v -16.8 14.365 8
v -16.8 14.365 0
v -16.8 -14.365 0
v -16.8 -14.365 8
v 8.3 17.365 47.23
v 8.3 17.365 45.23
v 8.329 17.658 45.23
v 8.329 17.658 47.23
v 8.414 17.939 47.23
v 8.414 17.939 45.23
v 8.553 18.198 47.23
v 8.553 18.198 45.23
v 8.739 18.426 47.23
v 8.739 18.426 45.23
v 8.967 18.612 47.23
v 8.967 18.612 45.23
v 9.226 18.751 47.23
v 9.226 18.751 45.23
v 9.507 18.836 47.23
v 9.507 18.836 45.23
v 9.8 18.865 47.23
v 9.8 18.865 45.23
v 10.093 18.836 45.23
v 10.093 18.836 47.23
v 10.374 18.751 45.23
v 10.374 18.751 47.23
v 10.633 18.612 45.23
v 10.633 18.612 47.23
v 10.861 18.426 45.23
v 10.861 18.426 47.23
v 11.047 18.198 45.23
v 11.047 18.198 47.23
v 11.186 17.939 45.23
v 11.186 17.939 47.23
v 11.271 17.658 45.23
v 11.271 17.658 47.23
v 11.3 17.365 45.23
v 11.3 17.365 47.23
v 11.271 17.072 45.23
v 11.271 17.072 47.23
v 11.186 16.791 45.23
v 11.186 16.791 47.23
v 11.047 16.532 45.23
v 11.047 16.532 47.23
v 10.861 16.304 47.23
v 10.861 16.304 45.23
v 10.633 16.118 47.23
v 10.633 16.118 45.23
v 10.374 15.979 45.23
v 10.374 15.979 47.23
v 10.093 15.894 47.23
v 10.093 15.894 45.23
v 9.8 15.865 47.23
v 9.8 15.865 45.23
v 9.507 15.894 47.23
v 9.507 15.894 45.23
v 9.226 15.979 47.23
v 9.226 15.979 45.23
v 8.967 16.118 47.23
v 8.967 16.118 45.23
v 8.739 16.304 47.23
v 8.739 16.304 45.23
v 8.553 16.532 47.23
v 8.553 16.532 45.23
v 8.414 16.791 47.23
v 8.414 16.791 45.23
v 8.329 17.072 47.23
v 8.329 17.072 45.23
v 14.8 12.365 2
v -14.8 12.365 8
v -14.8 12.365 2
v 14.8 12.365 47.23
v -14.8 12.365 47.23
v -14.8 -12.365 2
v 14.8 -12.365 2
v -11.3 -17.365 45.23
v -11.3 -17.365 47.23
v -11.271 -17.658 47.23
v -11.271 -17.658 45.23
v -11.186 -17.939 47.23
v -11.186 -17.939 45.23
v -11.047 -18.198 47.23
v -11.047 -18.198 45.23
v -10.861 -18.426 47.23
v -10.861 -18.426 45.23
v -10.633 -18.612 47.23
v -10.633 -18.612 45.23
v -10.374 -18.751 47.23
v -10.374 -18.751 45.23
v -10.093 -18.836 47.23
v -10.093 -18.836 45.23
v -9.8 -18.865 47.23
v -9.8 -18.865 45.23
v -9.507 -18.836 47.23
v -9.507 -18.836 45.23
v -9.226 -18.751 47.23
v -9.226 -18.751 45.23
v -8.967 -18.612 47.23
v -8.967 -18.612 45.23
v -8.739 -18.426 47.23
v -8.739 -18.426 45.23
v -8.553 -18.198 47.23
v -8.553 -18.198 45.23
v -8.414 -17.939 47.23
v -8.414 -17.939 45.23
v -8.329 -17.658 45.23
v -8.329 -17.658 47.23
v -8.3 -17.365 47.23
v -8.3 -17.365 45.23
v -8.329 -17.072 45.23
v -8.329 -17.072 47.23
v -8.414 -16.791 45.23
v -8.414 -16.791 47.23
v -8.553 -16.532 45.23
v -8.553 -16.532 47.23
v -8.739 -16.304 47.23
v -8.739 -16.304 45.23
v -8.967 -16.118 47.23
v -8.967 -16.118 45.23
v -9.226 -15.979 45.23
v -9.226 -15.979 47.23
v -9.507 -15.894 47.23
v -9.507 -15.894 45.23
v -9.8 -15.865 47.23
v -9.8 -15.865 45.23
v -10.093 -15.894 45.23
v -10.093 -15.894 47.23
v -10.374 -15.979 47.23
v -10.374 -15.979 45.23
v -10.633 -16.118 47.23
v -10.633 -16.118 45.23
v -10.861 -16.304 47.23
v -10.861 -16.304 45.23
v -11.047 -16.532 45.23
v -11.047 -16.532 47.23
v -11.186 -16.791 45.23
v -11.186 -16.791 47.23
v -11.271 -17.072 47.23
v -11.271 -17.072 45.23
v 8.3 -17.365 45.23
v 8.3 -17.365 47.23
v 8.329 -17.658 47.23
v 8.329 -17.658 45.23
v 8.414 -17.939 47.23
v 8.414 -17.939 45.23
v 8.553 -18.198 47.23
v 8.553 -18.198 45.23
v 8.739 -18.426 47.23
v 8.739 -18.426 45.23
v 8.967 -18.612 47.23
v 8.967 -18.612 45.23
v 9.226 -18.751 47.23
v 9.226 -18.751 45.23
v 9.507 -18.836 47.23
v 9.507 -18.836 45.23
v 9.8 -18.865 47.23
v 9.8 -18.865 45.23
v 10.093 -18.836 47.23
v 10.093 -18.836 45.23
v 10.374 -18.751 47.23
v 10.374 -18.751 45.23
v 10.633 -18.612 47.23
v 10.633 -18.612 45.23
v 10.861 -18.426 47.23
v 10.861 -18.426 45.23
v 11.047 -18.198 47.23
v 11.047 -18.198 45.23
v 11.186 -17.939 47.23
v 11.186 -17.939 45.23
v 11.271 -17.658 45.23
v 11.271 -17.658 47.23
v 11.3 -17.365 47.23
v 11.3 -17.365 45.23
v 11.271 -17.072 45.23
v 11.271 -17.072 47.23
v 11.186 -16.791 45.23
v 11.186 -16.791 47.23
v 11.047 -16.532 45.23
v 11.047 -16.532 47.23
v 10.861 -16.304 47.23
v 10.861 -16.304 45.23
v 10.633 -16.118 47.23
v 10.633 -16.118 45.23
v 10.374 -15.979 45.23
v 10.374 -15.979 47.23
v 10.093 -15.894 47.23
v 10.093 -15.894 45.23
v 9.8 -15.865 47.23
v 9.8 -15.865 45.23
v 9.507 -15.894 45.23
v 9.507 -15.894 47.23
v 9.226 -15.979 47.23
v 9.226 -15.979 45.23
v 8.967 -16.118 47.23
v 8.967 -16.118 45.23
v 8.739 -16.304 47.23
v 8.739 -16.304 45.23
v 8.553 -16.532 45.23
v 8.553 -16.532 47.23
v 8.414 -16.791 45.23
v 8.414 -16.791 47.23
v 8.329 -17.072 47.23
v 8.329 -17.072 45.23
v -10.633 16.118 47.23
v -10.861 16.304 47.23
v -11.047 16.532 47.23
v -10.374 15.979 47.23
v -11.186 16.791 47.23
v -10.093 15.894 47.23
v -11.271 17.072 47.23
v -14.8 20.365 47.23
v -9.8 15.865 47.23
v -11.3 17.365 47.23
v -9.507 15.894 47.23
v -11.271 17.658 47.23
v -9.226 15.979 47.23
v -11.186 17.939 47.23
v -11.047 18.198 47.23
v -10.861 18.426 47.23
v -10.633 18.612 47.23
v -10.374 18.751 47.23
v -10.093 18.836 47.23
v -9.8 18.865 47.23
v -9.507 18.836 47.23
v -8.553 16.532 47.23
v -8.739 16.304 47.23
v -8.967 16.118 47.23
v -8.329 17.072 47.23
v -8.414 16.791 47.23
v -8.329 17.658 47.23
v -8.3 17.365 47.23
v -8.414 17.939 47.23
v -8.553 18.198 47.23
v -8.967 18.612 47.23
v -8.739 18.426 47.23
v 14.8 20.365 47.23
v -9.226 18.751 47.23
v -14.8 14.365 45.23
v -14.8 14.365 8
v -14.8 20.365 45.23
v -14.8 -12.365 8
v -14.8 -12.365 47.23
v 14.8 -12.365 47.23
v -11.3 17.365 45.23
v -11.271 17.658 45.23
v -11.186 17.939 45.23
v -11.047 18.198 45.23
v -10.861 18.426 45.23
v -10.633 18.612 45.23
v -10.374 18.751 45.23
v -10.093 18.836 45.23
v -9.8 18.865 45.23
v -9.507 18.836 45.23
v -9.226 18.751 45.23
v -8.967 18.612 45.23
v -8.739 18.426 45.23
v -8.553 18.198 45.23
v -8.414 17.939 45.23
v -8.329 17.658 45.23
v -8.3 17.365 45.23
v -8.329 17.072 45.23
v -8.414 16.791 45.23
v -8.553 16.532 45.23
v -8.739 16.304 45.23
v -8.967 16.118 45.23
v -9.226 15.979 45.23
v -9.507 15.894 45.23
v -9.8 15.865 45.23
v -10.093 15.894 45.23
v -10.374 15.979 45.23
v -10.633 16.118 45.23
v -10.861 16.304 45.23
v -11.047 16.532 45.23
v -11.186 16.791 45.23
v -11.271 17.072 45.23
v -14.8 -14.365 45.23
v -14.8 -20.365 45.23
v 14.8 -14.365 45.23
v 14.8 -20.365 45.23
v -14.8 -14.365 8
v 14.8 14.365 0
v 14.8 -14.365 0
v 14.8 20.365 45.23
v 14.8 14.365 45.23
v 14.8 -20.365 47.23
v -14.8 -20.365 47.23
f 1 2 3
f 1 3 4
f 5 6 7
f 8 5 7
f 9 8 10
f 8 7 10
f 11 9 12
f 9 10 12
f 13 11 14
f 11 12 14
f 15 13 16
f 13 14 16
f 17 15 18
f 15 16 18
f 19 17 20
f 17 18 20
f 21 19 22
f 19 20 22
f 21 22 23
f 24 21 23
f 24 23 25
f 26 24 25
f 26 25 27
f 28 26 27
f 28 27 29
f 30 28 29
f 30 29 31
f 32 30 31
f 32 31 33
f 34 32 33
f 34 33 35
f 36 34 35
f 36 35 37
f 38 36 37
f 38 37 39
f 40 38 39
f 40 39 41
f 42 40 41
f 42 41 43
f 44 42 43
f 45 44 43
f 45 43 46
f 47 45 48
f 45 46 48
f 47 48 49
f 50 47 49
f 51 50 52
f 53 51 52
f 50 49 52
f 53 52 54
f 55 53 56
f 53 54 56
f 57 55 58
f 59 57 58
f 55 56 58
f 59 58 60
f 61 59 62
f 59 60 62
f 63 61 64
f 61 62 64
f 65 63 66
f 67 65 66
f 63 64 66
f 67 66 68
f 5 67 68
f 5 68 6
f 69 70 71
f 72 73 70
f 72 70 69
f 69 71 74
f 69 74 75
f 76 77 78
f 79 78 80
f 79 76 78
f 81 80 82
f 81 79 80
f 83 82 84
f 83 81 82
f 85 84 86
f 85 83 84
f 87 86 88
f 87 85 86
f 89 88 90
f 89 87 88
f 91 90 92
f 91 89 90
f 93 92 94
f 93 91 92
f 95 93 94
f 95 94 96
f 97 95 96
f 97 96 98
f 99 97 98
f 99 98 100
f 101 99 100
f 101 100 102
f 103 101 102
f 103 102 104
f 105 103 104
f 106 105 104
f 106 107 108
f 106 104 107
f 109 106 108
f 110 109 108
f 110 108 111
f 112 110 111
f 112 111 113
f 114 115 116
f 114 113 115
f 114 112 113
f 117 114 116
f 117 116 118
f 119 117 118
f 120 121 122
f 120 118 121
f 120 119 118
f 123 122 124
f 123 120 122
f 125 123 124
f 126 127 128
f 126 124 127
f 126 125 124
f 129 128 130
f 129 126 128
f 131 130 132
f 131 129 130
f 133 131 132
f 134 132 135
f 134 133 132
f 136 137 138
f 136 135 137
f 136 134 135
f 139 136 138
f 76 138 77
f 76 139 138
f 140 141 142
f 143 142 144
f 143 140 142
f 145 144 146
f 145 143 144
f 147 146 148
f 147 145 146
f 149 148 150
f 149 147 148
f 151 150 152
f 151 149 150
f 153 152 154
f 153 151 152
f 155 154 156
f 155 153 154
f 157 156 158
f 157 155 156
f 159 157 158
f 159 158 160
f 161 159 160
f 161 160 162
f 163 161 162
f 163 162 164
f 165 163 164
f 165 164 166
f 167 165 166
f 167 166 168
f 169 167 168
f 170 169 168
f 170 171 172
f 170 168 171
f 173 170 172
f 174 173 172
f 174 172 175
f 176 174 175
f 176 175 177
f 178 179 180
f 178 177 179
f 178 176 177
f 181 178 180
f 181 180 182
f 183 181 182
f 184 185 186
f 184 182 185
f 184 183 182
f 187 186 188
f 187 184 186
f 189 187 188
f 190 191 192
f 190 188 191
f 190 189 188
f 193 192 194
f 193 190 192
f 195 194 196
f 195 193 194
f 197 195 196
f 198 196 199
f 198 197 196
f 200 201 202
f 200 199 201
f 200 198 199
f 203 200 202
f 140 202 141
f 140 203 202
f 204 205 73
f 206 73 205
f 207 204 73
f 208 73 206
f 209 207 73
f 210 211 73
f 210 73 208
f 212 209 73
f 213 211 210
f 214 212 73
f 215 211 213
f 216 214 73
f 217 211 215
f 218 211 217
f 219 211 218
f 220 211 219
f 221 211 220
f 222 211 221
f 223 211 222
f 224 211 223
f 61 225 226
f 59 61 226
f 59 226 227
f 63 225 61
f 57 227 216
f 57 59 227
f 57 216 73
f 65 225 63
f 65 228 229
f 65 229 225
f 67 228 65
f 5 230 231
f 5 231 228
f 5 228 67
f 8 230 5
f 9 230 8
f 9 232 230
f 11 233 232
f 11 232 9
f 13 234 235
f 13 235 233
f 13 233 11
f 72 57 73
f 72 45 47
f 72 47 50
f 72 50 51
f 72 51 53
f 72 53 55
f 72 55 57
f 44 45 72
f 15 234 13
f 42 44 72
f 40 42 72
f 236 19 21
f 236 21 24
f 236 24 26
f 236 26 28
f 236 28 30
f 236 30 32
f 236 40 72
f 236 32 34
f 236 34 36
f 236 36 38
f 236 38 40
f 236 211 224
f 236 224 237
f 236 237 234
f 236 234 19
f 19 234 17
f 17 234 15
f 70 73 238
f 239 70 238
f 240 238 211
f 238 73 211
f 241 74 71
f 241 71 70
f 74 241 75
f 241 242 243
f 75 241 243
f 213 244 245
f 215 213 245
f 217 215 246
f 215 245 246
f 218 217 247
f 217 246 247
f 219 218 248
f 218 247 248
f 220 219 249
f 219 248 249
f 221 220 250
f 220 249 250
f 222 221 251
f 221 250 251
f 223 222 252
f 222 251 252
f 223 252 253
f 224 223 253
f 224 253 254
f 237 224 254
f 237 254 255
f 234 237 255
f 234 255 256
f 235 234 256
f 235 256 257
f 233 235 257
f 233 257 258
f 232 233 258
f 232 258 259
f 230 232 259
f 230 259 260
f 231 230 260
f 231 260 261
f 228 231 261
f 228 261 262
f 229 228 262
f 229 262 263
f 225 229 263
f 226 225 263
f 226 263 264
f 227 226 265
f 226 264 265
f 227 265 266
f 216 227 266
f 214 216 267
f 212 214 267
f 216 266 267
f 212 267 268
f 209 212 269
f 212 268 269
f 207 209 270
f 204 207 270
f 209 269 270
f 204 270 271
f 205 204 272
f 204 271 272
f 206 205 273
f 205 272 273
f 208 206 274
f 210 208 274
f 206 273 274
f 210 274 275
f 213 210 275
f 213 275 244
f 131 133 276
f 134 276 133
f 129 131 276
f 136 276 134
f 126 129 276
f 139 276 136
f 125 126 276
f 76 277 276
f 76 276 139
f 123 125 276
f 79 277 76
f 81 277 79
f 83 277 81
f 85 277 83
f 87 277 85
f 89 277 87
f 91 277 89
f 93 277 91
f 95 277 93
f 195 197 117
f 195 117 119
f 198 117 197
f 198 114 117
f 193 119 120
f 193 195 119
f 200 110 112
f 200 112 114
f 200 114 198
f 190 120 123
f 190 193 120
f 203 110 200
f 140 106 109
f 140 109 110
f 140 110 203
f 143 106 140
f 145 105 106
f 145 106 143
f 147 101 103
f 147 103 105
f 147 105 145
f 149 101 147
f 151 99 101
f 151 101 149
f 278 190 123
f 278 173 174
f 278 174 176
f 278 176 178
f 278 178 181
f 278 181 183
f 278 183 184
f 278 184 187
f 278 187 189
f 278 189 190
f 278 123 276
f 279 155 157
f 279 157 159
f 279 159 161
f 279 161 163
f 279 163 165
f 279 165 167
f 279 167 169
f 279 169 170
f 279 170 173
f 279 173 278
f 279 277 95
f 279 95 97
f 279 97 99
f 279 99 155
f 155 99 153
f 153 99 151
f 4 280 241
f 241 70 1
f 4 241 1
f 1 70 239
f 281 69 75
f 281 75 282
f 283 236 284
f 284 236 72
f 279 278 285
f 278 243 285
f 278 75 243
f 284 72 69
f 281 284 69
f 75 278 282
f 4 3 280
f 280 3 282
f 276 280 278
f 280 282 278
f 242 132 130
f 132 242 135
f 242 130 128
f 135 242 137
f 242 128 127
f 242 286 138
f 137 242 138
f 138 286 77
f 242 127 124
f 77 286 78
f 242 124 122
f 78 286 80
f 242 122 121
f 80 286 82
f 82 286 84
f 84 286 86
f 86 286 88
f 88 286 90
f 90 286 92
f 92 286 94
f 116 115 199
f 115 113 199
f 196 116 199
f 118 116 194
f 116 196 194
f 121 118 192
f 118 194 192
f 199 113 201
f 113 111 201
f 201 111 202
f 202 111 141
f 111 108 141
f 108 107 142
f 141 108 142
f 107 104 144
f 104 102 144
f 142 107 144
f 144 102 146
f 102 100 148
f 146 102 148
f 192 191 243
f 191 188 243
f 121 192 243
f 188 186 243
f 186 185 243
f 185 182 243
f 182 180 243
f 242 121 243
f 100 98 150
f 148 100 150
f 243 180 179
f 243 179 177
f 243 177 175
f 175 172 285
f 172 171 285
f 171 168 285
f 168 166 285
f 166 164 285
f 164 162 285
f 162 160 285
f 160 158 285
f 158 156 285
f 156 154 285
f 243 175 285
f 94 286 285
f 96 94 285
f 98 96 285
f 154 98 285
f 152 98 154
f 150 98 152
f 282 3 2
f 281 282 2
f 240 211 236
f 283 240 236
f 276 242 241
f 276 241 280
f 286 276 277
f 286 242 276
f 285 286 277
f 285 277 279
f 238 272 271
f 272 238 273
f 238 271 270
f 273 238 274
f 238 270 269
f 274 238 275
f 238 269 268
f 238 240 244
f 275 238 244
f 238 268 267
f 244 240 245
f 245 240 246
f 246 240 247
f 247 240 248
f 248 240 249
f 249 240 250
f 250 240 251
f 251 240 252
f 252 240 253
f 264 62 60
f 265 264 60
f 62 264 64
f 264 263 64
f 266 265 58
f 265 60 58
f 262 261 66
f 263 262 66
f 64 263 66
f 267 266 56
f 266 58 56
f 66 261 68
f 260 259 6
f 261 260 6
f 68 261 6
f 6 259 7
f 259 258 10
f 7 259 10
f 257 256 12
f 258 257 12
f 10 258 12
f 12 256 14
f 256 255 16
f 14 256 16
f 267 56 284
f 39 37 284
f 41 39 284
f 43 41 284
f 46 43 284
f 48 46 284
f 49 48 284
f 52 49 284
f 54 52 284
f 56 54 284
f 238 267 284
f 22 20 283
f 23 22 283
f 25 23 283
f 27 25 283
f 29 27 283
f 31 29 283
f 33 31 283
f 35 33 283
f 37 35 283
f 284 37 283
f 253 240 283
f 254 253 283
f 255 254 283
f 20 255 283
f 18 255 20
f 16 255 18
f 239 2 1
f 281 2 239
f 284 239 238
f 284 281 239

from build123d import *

# Parameters (mm, degrees)
SKETCH_1_W          = 29.6
SKETCH_1_H          = 28.73
EXTRUDE_1_DEPTH     = 47.23
SKETCH_2_W          = 29.6
SKETCH_2_H          = 24.73
CUT_EXTRUDE_1_DEPTH = 45.23
SKETCH_3_W          = 8
SKETCH_3_H          = 28.73
EXTRUDE_2_DEPTH     = 2
SKETCH_4_W          = 29.6
SKETCH_4_H          = 6
EXTRUDE_3_DEPTH     = 2
SKETCH_5_R          = 1.5
CUT_EXTRUDE_2_DEPTH = 53.37104281


with BuildPart() as part:
    # 草图1 → 凸台-拉伸1 (new body)
    with BuildSketch(Plane.XY):
        Rectangle(SKETCH_1_W, SKETCH_1_H)
    extrude(amount=EXTRUDE_1_DEPTH)

    # 草图2 → 切除-拉伸1 (cut)
    with BuildSketch(Plane.XY.offset(47.23)):
        Rectangle(SKETCH_2_W, SKETCH_2_H)
    extrude(amount=-CUT_EXTRUDE_1_DEPTH, mode=Mode.SUBTRACT)

    # 草图3 → 凸台-拉伸2 (add)
    with BuildSketch(Plane.ZY.offset(14.8)):
        with Locations((4, 0)):
            Rectangle(SKETCH_3_W, SKETCH_3_H)
    extrude(amount=EXTRUDE_2_DEPTH)

    # 草图4 → 凸台-拉伸3 (add)
    with BuildSketch(Plane.XY.offset(47.23)):
        with Locations((0, 17.365)):
            Rectangle(SKETCH_4_W, SKETCH_4_H)
    extrude_3 = extrude(amount=-EXTRUDE_3_DEPTH)

    # 草图5 → 切除-拉伸2 (cut, through all)
    with BuildSketch(Plane(origin=(0, 0, 45.23), x_dir=(-1, 0, 0), z_dir=(0, 0, -1))):
        with Locations((-9.8, 17.365)):
            Circle(SKETCH_5_R)
        with Locations((9.8, 17.365)):
            Circle(SKETCH_5_R)
    cut_extrude_2 = extrude(amount=-CUT_EXTRUDE_2_DEPTH, mode=Mode.SUBTRACT)

    # 镜向2: 凸台-拉伸3, 切除-拉伸2 across plane
    add(extrude_3.mirror(Plane.ZX))
    add(cut_extrude_2.mirror(Plane.ZX), mode=Mode.SUBTRACT)


solid = part.part
